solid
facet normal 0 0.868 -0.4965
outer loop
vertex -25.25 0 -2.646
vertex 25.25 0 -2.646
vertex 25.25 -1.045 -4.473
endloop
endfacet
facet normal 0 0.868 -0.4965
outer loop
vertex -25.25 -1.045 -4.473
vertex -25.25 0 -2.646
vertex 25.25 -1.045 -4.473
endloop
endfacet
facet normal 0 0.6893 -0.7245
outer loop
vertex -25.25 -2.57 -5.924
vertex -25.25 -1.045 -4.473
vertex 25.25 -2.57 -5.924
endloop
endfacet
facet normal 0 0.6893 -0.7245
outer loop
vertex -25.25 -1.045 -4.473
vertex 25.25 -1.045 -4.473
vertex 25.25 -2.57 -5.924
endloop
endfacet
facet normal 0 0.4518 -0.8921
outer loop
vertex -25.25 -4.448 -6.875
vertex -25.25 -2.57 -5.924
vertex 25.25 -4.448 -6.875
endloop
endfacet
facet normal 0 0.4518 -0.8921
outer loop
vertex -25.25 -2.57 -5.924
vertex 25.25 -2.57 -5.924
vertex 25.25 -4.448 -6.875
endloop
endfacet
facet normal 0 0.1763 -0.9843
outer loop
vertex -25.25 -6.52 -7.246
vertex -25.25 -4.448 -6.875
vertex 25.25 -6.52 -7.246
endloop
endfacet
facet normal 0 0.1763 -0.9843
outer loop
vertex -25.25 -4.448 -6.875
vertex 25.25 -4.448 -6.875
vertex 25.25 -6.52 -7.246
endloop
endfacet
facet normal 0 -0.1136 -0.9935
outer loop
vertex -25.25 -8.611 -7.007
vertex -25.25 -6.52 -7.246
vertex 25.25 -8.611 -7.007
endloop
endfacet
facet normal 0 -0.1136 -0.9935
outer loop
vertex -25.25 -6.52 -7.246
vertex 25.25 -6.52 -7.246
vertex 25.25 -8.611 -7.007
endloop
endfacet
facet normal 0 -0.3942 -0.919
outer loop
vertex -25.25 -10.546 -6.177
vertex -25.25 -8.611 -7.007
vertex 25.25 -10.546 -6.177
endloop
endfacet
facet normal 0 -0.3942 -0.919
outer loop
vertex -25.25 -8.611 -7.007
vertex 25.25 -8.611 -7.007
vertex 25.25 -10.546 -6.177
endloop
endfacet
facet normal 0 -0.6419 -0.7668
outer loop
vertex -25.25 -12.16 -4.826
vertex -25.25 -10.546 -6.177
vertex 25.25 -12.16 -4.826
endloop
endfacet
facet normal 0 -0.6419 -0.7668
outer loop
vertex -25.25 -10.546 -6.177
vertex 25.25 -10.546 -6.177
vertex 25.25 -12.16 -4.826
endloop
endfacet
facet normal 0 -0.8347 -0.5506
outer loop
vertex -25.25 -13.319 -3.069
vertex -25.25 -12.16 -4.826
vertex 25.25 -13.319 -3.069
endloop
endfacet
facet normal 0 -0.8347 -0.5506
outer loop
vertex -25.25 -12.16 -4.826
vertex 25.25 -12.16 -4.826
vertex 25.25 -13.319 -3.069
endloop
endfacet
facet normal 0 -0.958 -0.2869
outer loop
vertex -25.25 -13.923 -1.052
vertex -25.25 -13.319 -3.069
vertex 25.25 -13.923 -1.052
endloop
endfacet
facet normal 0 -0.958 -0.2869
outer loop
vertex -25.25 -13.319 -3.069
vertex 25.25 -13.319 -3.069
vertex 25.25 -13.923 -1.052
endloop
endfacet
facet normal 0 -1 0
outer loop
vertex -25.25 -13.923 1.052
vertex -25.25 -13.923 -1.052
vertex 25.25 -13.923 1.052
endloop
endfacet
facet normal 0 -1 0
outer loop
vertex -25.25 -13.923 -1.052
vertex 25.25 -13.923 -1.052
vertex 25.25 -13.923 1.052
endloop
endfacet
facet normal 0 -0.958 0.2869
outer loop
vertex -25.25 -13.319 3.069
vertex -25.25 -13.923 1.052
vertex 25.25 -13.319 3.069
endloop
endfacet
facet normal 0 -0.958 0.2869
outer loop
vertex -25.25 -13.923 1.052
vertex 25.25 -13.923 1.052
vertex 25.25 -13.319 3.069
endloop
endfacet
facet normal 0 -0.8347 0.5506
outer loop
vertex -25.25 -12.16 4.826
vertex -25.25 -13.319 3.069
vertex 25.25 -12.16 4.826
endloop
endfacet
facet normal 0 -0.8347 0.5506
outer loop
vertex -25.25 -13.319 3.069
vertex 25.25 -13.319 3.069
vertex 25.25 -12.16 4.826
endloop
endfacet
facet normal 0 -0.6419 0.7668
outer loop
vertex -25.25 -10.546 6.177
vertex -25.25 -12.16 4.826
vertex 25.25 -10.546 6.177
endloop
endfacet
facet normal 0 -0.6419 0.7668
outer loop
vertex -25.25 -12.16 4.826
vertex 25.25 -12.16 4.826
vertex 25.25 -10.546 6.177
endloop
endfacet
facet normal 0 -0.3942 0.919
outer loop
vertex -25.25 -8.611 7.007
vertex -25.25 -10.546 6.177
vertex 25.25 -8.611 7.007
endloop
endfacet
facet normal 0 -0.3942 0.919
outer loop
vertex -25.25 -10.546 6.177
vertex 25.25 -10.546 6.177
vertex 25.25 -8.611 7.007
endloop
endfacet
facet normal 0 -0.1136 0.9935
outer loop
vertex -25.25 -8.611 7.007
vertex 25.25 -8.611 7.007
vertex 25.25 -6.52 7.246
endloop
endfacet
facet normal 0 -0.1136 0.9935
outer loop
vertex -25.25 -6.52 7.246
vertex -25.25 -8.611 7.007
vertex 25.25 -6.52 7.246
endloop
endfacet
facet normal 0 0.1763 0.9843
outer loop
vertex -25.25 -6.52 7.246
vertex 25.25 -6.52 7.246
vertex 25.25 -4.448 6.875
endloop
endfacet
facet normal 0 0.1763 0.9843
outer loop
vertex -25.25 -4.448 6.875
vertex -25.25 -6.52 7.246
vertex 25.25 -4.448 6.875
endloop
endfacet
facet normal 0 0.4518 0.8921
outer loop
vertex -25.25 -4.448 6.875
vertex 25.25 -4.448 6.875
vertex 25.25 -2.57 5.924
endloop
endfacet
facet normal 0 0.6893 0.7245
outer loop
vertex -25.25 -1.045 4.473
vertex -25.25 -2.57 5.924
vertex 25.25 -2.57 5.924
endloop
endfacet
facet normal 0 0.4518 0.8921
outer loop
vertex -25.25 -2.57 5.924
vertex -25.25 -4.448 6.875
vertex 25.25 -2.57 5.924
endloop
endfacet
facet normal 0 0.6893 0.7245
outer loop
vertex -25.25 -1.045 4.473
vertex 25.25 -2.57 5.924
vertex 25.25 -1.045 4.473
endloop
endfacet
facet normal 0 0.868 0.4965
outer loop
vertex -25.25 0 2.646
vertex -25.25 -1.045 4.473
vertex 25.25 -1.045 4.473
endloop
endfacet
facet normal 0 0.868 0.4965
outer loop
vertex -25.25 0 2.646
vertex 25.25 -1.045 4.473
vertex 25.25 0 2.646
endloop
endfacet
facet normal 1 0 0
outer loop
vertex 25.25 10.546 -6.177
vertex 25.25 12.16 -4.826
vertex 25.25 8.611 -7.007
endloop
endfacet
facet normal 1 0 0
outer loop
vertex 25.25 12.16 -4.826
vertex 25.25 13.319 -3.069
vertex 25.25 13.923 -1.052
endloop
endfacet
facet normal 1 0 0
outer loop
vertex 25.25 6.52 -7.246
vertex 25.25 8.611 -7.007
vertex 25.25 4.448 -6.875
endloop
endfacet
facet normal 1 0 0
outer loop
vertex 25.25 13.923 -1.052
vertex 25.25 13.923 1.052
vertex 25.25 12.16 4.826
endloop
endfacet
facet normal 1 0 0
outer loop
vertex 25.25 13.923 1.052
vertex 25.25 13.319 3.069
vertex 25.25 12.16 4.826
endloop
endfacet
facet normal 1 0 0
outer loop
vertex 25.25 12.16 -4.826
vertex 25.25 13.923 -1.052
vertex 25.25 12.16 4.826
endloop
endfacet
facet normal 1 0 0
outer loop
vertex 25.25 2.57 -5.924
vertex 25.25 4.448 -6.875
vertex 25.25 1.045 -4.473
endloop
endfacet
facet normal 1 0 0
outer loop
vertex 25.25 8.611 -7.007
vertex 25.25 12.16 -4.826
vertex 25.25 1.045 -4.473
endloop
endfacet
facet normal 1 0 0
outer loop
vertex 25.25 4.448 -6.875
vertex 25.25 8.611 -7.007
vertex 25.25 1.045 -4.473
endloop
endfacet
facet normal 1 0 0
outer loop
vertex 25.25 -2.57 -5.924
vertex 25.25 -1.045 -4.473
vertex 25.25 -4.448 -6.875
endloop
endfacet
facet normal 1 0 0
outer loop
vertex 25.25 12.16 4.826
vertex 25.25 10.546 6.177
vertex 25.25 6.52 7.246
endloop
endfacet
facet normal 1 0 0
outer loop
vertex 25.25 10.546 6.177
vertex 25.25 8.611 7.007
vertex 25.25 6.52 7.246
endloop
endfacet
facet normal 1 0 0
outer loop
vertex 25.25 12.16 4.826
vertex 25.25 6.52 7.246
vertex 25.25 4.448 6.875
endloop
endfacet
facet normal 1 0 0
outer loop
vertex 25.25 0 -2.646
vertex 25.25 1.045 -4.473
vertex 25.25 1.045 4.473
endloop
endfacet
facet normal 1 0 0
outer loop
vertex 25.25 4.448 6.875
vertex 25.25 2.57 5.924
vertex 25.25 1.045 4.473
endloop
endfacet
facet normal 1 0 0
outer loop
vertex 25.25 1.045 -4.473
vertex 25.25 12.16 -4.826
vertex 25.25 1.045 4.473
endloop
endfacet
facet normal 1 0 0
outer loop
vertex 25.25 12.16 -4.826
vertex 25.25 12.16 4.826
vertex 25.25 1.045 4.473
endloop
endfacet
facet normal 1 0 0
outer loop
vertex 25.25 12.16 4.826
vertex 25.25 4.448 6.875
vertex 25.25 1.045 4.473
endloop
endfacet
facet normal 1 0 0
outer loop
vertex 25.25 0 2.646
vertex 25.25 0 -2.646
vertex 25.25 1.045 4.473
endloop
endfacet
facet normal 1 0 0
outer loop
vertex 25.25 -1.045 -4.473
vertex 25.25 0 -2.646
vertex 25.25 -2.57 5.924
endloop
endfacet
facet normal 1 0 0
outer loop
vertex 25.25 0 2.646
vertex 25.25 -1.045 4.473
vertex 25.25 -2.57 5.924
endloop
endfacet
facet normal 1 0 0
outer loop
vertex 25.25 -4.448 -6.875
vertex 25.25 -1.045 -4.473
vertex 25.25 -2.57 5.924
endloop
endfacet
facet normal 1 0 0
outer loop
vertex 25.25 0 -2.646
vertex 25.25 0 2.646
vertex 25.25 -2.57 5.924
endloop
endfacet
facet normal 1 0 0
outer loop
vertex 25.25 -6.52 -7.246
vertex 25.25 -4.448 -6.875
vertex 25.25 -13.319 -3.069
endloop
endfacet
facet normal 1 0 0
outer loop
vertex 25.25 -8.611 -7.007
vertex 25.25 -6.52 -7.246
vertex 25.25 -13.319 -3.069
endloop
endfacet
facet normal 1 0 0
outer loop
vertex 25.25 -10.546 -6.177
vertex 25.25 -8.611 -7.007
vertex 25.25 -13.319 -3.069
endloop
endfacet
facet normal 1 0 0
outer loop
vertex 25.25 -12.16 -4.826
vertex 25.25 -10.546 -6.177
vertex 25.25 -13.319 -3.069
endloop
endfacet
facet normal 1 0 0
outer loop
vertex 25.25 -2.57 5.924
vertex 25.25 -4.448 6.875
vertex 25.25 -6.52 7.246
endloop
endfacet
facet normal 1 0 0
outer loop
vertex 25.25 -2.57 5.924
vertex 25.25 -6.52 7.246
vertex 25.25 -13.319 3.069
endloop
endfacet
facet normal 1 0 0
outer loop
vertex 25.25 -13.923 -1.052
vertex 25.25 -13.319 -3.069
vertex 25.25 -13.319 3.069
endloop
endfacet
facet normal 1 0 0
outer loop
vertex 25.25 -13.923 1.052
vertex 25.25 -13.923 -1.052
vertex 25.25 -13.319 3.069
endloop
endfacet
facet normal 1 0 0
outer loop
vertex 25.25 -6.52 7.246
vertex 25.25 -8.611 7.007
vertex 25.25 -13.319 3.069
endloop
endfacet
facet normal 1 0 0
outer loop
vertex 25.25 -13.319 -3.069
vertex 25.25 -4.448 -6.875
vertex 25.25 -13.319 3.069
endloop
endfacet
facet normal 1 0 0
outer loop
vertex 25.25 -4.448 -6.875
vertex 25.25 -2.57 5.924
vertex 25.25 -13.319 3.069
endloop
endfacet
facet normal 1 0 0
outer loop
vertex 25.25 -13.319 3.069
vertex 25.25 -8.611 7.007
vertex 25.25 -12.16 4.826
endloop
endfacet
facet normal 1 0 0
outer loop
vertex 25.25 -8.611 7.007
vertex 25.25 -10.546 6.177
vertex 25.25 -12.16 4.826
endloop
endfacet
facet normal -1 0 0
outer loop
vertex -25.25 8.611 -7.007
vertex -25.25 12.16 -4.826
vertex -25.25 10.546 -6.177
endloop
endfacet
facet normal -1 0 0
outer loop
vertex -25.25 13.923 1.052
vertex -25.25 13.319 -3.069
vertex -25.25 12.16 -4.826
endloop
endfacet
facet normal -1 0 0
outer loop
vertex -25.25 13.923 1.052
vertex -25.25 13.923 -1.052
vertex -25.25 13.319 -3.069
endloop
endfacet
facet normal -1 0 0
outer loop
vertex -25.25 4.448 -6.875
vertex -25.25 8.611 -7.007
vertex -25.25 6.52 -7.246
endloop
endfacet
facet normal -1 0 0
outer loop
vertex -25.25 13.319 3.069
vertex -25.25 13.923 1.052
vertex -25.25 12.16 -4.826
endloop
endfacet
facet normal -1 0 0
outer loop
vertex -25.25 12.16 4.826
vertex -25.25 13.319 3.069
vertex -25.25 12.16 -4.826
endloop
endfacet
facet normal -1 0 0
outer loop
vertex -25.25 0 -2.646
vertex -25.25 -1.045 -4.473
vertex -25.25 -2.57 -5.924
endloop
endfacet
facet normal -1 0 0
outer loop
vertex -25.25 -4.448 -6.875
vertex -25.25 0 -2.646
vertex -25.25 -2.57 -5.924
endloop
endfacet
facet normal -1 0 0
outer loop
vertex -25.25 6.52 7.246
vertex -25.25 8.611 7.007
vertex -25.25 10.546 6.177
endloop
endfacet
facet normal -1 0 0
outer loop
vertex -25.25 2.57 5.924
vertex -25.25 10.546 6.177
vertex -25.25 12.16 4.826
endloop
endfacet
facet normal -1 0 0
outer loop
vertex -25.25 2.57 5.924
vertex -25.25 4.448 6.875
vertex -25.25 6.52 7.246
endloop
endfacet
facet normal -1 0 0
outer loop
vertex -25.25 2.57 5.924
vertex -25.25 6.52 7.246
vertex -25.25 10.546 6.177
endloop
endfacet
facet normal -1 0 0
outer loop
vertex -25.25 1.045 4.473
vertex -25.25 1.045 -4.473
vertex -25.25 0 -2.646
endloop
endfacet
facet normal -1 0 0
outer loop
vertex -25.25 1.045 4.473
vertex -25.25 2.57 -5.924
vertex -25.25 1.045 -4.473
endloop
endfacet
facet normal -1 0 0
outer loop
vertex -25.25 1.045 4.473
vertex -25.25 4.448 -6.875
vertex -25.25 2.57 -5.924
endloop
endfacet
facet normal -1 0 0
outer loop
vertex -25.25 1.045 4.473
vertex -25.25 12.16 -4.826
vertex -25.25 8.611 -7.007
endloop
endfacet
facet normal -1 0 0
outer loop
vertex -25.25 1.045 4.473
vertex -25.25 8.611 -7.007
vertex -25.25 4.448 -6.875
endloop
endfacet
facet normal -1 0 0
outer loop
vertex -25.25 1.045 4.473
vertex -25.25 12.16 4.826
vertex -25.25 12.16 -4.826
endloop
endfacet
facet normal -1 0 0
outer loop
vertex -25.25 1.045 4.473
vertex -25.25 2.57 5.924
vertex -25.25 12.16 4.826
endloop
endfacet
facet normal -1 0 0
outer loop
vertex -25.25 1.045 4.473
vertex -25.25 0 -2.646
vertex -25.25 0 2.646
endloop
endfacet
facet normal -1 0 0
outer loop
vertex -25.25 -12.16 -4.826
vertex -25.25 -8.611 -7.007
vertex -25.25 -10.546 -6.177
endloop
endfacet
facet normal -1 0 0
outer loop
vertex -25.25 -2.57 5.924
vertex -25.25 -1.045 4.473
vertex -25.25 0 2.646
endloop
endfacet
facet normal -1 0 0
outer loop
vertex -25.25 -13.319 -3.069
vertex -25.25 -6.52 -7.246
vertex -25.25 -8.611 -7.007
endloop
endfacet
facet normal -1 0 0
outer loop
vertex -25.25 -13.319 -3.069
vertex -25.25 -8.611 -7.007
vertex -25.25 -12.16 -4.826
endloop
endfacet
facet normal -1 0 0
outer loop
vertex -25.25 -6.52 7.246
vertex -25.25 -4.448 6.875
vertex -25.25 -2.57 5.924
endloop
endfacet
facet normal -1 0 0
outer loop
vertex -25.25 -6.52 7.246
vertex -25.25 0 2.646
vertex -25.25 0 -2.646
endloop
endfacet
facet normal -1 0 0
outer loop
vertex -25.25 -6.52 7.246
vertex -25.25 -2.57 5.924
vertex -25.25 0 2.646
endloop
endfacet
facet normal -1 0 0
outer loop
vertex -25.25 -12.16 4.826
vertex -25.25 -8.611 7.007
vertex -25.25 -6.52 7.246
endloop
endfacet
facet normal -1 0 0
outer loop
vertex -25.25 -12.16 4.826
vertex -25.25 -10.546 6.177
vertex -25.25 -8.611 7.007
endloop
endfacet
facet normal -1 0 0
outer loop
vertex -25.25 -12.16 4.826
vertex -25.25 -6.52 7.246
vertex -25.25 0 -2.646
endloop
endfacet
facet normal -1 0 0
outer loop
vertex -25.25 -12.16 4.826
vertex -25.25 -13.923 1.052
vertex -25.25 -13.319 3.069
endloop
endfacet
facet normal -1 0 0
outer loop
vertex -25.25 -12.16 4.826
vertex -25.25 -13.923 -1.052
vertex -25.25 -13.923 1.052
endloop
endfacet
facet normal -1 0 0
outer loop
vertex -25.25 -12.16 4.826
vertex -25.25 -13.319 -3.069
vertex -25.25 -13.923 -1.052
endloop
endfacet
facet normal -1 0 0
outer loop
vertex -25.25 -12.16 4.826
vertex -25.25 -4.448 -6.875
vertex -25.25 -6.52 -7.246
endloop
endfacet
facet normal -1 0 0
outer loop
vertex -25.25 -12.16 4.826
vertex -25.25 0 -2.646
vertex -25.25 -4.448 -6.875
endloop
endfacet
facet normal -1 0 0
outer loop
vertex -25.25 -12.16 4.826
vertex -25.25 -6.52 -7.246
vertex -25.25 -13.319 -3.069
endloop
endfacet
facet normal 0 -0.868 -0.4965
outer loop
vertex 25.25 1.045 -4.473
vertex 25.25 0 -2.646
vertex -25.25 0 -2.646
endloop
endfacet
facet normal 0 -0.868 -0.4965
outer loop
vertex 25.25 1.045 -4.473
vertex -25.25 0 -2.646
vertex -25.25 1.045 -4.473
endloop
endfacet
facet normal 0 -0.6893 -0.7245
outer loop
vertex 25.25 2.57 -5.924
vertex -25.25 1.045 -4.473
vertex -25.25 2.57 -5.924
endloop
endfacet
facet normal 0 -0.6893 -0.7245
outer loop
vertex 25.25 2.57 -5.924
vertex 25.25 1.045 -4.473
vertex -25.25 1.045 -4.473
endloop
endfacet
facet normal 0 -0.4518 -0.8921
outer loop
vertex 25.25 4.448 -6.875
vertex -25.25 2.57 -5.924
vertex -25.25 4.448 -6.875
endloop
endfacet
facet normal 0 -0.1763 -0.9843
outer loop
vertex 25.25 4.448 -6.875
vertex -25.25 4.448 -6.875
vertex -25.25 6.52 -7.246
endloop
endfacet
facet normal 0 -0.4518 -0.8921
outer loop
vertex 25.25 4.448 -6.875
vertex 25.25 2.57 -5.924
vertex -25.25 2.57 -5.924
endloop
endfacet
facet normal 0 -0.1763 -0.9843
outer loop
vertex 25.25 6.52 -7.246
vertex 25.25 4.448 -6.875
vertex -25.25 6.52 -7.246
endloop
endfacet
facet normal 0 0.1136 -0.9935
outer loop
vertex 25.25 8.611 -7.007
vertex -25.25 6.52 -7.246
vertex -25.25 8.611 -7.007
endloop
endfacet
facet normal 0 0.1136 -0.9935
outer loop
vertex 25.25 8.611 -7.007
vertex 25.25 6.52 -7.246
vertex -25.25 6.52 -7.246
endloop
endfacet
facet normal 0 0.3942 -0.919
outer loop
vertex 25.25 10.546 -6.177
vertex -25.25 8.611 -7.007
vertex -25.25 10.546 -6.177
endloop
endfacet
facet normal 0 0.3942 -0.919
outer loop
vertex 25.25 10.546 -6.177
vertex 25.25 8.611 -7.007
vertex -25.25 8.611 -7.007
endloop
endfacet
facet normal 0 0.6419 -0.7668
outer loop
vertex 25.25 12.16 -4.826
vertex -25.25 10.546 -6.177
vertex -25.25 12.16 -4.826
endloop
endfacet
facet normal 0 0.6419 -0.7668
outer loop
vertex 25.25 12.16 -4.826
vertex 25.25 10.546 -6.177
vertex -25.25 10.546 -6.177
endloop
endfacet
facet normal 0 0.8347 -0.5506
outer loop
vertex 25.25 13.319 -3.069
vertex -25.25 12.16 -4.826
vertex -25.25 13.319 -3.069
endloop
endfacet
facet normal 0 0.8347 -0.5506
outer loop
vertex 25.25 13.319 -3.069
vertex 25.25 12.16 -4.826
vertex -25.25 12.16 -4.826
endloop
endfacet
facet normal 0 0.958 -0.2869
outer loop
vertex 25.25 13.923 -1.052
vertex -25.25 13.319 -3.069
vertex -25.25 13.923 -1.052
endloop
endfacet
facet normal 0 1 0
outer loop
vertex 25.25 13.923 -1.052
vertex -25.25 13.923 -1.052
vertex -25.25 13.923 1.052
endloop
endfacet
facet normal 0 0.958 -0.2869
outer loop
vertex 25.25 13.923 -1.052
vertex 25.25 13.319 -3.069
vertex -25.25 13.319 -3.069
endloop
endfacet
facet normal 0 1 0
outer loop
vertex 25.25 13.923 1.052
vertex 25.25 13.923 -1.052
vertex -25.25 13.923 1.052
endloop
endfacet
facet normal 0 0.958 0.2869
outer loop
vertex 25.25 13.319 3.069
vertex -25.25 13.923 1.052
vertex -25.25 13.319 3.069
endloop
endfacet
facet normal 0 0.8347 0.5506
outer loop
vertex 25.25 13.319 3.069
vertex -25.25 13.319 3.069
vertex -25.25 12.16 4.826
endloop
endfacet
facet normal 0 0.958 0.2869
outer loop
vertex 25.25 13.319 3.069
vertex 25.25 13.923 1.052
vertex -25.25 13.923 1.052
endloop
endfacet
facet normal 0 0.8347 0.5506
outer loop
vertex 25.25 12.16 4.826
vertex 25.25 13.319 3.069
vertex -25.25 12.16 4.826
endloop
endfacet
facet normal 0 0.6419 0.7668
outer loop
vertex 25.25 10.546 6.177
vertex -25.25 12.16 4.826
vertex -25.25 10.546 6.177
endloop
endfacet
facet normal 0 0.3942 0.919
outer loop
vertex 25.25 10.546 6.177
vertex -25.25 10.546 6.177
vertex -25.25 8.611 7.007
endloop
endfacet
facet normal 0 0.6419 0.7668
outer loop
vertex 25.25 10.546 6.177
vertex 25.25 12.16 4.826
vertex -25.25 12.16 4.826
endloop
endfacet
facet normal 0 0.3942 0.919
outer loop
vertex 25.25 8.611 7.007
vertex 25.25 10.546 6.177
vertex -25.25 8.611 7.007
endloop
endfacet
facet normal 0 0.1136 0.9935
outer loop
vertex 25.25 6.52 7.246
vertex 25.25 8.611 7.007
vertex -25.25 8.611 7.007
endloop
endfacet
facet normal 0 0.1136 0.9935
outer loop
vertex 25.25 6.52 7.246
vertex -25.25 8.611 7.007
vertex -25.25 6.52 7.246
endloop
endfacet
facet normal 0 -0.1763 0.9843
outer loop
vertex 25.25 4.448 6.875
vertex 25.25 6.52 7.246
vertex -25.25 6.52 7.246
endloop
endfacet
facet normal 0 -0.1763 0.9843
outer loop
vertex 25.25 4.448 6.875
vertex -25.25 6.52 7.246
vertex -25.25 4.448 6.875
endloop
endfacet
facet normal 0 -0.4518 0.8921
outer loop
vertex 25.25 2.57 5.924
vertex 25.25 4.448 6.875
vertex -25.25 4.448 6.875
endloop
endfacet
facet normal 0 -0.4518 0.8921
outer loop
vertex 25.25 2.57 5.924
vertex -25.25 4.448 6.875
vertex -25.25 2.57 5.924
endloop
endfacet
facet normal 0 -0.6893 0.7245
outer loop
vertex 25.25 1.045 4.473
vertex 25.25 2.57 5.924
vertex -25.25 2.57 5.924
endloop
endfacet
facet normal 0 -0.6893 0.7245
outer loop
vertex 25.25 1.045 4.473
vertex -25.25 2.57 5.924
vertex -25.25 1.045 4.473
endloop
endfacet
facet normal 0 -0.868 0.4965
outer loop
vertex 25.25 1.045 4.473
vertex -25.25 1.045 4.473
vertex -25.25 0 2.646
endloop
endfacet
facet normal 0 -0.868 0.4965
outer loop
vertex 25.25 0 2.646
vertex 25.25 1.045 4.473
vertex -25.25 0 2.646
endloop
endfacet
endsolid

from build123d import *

# Parameters (mm, degrees)
F0_R     = 7.25
F1_DEPTH = 25.25
F3_R     = 11
F3_R_2   = 6.35
F4_DEPTH = 7.25


with BuildPart() as f1:
    # F0 (on Right) → F1 (new body, symmetric)
    with BuildSketch(Plane.YZ):
        with Locations((6.75, 0)):
            Circle(F0_R)
    extrude(amount=F1_DEPTH, both=True)

    # F2: F1 across plane


with BuildPart() as f1_1:
    add(f1.part)
    add(f1.part.mirror(Plane.XZ))


with BuildPart() as f4:
    # F3 (on Top) → F4 (new body, symmetric)
    with BuildSketch(Plane.XY):
        Circle(F3_R)
        Circle(F3_R_2, mode=Mode.SUBTRACT)
    extrude(amount=F4_DEPTH, both=True)


solid = f1_1.part
